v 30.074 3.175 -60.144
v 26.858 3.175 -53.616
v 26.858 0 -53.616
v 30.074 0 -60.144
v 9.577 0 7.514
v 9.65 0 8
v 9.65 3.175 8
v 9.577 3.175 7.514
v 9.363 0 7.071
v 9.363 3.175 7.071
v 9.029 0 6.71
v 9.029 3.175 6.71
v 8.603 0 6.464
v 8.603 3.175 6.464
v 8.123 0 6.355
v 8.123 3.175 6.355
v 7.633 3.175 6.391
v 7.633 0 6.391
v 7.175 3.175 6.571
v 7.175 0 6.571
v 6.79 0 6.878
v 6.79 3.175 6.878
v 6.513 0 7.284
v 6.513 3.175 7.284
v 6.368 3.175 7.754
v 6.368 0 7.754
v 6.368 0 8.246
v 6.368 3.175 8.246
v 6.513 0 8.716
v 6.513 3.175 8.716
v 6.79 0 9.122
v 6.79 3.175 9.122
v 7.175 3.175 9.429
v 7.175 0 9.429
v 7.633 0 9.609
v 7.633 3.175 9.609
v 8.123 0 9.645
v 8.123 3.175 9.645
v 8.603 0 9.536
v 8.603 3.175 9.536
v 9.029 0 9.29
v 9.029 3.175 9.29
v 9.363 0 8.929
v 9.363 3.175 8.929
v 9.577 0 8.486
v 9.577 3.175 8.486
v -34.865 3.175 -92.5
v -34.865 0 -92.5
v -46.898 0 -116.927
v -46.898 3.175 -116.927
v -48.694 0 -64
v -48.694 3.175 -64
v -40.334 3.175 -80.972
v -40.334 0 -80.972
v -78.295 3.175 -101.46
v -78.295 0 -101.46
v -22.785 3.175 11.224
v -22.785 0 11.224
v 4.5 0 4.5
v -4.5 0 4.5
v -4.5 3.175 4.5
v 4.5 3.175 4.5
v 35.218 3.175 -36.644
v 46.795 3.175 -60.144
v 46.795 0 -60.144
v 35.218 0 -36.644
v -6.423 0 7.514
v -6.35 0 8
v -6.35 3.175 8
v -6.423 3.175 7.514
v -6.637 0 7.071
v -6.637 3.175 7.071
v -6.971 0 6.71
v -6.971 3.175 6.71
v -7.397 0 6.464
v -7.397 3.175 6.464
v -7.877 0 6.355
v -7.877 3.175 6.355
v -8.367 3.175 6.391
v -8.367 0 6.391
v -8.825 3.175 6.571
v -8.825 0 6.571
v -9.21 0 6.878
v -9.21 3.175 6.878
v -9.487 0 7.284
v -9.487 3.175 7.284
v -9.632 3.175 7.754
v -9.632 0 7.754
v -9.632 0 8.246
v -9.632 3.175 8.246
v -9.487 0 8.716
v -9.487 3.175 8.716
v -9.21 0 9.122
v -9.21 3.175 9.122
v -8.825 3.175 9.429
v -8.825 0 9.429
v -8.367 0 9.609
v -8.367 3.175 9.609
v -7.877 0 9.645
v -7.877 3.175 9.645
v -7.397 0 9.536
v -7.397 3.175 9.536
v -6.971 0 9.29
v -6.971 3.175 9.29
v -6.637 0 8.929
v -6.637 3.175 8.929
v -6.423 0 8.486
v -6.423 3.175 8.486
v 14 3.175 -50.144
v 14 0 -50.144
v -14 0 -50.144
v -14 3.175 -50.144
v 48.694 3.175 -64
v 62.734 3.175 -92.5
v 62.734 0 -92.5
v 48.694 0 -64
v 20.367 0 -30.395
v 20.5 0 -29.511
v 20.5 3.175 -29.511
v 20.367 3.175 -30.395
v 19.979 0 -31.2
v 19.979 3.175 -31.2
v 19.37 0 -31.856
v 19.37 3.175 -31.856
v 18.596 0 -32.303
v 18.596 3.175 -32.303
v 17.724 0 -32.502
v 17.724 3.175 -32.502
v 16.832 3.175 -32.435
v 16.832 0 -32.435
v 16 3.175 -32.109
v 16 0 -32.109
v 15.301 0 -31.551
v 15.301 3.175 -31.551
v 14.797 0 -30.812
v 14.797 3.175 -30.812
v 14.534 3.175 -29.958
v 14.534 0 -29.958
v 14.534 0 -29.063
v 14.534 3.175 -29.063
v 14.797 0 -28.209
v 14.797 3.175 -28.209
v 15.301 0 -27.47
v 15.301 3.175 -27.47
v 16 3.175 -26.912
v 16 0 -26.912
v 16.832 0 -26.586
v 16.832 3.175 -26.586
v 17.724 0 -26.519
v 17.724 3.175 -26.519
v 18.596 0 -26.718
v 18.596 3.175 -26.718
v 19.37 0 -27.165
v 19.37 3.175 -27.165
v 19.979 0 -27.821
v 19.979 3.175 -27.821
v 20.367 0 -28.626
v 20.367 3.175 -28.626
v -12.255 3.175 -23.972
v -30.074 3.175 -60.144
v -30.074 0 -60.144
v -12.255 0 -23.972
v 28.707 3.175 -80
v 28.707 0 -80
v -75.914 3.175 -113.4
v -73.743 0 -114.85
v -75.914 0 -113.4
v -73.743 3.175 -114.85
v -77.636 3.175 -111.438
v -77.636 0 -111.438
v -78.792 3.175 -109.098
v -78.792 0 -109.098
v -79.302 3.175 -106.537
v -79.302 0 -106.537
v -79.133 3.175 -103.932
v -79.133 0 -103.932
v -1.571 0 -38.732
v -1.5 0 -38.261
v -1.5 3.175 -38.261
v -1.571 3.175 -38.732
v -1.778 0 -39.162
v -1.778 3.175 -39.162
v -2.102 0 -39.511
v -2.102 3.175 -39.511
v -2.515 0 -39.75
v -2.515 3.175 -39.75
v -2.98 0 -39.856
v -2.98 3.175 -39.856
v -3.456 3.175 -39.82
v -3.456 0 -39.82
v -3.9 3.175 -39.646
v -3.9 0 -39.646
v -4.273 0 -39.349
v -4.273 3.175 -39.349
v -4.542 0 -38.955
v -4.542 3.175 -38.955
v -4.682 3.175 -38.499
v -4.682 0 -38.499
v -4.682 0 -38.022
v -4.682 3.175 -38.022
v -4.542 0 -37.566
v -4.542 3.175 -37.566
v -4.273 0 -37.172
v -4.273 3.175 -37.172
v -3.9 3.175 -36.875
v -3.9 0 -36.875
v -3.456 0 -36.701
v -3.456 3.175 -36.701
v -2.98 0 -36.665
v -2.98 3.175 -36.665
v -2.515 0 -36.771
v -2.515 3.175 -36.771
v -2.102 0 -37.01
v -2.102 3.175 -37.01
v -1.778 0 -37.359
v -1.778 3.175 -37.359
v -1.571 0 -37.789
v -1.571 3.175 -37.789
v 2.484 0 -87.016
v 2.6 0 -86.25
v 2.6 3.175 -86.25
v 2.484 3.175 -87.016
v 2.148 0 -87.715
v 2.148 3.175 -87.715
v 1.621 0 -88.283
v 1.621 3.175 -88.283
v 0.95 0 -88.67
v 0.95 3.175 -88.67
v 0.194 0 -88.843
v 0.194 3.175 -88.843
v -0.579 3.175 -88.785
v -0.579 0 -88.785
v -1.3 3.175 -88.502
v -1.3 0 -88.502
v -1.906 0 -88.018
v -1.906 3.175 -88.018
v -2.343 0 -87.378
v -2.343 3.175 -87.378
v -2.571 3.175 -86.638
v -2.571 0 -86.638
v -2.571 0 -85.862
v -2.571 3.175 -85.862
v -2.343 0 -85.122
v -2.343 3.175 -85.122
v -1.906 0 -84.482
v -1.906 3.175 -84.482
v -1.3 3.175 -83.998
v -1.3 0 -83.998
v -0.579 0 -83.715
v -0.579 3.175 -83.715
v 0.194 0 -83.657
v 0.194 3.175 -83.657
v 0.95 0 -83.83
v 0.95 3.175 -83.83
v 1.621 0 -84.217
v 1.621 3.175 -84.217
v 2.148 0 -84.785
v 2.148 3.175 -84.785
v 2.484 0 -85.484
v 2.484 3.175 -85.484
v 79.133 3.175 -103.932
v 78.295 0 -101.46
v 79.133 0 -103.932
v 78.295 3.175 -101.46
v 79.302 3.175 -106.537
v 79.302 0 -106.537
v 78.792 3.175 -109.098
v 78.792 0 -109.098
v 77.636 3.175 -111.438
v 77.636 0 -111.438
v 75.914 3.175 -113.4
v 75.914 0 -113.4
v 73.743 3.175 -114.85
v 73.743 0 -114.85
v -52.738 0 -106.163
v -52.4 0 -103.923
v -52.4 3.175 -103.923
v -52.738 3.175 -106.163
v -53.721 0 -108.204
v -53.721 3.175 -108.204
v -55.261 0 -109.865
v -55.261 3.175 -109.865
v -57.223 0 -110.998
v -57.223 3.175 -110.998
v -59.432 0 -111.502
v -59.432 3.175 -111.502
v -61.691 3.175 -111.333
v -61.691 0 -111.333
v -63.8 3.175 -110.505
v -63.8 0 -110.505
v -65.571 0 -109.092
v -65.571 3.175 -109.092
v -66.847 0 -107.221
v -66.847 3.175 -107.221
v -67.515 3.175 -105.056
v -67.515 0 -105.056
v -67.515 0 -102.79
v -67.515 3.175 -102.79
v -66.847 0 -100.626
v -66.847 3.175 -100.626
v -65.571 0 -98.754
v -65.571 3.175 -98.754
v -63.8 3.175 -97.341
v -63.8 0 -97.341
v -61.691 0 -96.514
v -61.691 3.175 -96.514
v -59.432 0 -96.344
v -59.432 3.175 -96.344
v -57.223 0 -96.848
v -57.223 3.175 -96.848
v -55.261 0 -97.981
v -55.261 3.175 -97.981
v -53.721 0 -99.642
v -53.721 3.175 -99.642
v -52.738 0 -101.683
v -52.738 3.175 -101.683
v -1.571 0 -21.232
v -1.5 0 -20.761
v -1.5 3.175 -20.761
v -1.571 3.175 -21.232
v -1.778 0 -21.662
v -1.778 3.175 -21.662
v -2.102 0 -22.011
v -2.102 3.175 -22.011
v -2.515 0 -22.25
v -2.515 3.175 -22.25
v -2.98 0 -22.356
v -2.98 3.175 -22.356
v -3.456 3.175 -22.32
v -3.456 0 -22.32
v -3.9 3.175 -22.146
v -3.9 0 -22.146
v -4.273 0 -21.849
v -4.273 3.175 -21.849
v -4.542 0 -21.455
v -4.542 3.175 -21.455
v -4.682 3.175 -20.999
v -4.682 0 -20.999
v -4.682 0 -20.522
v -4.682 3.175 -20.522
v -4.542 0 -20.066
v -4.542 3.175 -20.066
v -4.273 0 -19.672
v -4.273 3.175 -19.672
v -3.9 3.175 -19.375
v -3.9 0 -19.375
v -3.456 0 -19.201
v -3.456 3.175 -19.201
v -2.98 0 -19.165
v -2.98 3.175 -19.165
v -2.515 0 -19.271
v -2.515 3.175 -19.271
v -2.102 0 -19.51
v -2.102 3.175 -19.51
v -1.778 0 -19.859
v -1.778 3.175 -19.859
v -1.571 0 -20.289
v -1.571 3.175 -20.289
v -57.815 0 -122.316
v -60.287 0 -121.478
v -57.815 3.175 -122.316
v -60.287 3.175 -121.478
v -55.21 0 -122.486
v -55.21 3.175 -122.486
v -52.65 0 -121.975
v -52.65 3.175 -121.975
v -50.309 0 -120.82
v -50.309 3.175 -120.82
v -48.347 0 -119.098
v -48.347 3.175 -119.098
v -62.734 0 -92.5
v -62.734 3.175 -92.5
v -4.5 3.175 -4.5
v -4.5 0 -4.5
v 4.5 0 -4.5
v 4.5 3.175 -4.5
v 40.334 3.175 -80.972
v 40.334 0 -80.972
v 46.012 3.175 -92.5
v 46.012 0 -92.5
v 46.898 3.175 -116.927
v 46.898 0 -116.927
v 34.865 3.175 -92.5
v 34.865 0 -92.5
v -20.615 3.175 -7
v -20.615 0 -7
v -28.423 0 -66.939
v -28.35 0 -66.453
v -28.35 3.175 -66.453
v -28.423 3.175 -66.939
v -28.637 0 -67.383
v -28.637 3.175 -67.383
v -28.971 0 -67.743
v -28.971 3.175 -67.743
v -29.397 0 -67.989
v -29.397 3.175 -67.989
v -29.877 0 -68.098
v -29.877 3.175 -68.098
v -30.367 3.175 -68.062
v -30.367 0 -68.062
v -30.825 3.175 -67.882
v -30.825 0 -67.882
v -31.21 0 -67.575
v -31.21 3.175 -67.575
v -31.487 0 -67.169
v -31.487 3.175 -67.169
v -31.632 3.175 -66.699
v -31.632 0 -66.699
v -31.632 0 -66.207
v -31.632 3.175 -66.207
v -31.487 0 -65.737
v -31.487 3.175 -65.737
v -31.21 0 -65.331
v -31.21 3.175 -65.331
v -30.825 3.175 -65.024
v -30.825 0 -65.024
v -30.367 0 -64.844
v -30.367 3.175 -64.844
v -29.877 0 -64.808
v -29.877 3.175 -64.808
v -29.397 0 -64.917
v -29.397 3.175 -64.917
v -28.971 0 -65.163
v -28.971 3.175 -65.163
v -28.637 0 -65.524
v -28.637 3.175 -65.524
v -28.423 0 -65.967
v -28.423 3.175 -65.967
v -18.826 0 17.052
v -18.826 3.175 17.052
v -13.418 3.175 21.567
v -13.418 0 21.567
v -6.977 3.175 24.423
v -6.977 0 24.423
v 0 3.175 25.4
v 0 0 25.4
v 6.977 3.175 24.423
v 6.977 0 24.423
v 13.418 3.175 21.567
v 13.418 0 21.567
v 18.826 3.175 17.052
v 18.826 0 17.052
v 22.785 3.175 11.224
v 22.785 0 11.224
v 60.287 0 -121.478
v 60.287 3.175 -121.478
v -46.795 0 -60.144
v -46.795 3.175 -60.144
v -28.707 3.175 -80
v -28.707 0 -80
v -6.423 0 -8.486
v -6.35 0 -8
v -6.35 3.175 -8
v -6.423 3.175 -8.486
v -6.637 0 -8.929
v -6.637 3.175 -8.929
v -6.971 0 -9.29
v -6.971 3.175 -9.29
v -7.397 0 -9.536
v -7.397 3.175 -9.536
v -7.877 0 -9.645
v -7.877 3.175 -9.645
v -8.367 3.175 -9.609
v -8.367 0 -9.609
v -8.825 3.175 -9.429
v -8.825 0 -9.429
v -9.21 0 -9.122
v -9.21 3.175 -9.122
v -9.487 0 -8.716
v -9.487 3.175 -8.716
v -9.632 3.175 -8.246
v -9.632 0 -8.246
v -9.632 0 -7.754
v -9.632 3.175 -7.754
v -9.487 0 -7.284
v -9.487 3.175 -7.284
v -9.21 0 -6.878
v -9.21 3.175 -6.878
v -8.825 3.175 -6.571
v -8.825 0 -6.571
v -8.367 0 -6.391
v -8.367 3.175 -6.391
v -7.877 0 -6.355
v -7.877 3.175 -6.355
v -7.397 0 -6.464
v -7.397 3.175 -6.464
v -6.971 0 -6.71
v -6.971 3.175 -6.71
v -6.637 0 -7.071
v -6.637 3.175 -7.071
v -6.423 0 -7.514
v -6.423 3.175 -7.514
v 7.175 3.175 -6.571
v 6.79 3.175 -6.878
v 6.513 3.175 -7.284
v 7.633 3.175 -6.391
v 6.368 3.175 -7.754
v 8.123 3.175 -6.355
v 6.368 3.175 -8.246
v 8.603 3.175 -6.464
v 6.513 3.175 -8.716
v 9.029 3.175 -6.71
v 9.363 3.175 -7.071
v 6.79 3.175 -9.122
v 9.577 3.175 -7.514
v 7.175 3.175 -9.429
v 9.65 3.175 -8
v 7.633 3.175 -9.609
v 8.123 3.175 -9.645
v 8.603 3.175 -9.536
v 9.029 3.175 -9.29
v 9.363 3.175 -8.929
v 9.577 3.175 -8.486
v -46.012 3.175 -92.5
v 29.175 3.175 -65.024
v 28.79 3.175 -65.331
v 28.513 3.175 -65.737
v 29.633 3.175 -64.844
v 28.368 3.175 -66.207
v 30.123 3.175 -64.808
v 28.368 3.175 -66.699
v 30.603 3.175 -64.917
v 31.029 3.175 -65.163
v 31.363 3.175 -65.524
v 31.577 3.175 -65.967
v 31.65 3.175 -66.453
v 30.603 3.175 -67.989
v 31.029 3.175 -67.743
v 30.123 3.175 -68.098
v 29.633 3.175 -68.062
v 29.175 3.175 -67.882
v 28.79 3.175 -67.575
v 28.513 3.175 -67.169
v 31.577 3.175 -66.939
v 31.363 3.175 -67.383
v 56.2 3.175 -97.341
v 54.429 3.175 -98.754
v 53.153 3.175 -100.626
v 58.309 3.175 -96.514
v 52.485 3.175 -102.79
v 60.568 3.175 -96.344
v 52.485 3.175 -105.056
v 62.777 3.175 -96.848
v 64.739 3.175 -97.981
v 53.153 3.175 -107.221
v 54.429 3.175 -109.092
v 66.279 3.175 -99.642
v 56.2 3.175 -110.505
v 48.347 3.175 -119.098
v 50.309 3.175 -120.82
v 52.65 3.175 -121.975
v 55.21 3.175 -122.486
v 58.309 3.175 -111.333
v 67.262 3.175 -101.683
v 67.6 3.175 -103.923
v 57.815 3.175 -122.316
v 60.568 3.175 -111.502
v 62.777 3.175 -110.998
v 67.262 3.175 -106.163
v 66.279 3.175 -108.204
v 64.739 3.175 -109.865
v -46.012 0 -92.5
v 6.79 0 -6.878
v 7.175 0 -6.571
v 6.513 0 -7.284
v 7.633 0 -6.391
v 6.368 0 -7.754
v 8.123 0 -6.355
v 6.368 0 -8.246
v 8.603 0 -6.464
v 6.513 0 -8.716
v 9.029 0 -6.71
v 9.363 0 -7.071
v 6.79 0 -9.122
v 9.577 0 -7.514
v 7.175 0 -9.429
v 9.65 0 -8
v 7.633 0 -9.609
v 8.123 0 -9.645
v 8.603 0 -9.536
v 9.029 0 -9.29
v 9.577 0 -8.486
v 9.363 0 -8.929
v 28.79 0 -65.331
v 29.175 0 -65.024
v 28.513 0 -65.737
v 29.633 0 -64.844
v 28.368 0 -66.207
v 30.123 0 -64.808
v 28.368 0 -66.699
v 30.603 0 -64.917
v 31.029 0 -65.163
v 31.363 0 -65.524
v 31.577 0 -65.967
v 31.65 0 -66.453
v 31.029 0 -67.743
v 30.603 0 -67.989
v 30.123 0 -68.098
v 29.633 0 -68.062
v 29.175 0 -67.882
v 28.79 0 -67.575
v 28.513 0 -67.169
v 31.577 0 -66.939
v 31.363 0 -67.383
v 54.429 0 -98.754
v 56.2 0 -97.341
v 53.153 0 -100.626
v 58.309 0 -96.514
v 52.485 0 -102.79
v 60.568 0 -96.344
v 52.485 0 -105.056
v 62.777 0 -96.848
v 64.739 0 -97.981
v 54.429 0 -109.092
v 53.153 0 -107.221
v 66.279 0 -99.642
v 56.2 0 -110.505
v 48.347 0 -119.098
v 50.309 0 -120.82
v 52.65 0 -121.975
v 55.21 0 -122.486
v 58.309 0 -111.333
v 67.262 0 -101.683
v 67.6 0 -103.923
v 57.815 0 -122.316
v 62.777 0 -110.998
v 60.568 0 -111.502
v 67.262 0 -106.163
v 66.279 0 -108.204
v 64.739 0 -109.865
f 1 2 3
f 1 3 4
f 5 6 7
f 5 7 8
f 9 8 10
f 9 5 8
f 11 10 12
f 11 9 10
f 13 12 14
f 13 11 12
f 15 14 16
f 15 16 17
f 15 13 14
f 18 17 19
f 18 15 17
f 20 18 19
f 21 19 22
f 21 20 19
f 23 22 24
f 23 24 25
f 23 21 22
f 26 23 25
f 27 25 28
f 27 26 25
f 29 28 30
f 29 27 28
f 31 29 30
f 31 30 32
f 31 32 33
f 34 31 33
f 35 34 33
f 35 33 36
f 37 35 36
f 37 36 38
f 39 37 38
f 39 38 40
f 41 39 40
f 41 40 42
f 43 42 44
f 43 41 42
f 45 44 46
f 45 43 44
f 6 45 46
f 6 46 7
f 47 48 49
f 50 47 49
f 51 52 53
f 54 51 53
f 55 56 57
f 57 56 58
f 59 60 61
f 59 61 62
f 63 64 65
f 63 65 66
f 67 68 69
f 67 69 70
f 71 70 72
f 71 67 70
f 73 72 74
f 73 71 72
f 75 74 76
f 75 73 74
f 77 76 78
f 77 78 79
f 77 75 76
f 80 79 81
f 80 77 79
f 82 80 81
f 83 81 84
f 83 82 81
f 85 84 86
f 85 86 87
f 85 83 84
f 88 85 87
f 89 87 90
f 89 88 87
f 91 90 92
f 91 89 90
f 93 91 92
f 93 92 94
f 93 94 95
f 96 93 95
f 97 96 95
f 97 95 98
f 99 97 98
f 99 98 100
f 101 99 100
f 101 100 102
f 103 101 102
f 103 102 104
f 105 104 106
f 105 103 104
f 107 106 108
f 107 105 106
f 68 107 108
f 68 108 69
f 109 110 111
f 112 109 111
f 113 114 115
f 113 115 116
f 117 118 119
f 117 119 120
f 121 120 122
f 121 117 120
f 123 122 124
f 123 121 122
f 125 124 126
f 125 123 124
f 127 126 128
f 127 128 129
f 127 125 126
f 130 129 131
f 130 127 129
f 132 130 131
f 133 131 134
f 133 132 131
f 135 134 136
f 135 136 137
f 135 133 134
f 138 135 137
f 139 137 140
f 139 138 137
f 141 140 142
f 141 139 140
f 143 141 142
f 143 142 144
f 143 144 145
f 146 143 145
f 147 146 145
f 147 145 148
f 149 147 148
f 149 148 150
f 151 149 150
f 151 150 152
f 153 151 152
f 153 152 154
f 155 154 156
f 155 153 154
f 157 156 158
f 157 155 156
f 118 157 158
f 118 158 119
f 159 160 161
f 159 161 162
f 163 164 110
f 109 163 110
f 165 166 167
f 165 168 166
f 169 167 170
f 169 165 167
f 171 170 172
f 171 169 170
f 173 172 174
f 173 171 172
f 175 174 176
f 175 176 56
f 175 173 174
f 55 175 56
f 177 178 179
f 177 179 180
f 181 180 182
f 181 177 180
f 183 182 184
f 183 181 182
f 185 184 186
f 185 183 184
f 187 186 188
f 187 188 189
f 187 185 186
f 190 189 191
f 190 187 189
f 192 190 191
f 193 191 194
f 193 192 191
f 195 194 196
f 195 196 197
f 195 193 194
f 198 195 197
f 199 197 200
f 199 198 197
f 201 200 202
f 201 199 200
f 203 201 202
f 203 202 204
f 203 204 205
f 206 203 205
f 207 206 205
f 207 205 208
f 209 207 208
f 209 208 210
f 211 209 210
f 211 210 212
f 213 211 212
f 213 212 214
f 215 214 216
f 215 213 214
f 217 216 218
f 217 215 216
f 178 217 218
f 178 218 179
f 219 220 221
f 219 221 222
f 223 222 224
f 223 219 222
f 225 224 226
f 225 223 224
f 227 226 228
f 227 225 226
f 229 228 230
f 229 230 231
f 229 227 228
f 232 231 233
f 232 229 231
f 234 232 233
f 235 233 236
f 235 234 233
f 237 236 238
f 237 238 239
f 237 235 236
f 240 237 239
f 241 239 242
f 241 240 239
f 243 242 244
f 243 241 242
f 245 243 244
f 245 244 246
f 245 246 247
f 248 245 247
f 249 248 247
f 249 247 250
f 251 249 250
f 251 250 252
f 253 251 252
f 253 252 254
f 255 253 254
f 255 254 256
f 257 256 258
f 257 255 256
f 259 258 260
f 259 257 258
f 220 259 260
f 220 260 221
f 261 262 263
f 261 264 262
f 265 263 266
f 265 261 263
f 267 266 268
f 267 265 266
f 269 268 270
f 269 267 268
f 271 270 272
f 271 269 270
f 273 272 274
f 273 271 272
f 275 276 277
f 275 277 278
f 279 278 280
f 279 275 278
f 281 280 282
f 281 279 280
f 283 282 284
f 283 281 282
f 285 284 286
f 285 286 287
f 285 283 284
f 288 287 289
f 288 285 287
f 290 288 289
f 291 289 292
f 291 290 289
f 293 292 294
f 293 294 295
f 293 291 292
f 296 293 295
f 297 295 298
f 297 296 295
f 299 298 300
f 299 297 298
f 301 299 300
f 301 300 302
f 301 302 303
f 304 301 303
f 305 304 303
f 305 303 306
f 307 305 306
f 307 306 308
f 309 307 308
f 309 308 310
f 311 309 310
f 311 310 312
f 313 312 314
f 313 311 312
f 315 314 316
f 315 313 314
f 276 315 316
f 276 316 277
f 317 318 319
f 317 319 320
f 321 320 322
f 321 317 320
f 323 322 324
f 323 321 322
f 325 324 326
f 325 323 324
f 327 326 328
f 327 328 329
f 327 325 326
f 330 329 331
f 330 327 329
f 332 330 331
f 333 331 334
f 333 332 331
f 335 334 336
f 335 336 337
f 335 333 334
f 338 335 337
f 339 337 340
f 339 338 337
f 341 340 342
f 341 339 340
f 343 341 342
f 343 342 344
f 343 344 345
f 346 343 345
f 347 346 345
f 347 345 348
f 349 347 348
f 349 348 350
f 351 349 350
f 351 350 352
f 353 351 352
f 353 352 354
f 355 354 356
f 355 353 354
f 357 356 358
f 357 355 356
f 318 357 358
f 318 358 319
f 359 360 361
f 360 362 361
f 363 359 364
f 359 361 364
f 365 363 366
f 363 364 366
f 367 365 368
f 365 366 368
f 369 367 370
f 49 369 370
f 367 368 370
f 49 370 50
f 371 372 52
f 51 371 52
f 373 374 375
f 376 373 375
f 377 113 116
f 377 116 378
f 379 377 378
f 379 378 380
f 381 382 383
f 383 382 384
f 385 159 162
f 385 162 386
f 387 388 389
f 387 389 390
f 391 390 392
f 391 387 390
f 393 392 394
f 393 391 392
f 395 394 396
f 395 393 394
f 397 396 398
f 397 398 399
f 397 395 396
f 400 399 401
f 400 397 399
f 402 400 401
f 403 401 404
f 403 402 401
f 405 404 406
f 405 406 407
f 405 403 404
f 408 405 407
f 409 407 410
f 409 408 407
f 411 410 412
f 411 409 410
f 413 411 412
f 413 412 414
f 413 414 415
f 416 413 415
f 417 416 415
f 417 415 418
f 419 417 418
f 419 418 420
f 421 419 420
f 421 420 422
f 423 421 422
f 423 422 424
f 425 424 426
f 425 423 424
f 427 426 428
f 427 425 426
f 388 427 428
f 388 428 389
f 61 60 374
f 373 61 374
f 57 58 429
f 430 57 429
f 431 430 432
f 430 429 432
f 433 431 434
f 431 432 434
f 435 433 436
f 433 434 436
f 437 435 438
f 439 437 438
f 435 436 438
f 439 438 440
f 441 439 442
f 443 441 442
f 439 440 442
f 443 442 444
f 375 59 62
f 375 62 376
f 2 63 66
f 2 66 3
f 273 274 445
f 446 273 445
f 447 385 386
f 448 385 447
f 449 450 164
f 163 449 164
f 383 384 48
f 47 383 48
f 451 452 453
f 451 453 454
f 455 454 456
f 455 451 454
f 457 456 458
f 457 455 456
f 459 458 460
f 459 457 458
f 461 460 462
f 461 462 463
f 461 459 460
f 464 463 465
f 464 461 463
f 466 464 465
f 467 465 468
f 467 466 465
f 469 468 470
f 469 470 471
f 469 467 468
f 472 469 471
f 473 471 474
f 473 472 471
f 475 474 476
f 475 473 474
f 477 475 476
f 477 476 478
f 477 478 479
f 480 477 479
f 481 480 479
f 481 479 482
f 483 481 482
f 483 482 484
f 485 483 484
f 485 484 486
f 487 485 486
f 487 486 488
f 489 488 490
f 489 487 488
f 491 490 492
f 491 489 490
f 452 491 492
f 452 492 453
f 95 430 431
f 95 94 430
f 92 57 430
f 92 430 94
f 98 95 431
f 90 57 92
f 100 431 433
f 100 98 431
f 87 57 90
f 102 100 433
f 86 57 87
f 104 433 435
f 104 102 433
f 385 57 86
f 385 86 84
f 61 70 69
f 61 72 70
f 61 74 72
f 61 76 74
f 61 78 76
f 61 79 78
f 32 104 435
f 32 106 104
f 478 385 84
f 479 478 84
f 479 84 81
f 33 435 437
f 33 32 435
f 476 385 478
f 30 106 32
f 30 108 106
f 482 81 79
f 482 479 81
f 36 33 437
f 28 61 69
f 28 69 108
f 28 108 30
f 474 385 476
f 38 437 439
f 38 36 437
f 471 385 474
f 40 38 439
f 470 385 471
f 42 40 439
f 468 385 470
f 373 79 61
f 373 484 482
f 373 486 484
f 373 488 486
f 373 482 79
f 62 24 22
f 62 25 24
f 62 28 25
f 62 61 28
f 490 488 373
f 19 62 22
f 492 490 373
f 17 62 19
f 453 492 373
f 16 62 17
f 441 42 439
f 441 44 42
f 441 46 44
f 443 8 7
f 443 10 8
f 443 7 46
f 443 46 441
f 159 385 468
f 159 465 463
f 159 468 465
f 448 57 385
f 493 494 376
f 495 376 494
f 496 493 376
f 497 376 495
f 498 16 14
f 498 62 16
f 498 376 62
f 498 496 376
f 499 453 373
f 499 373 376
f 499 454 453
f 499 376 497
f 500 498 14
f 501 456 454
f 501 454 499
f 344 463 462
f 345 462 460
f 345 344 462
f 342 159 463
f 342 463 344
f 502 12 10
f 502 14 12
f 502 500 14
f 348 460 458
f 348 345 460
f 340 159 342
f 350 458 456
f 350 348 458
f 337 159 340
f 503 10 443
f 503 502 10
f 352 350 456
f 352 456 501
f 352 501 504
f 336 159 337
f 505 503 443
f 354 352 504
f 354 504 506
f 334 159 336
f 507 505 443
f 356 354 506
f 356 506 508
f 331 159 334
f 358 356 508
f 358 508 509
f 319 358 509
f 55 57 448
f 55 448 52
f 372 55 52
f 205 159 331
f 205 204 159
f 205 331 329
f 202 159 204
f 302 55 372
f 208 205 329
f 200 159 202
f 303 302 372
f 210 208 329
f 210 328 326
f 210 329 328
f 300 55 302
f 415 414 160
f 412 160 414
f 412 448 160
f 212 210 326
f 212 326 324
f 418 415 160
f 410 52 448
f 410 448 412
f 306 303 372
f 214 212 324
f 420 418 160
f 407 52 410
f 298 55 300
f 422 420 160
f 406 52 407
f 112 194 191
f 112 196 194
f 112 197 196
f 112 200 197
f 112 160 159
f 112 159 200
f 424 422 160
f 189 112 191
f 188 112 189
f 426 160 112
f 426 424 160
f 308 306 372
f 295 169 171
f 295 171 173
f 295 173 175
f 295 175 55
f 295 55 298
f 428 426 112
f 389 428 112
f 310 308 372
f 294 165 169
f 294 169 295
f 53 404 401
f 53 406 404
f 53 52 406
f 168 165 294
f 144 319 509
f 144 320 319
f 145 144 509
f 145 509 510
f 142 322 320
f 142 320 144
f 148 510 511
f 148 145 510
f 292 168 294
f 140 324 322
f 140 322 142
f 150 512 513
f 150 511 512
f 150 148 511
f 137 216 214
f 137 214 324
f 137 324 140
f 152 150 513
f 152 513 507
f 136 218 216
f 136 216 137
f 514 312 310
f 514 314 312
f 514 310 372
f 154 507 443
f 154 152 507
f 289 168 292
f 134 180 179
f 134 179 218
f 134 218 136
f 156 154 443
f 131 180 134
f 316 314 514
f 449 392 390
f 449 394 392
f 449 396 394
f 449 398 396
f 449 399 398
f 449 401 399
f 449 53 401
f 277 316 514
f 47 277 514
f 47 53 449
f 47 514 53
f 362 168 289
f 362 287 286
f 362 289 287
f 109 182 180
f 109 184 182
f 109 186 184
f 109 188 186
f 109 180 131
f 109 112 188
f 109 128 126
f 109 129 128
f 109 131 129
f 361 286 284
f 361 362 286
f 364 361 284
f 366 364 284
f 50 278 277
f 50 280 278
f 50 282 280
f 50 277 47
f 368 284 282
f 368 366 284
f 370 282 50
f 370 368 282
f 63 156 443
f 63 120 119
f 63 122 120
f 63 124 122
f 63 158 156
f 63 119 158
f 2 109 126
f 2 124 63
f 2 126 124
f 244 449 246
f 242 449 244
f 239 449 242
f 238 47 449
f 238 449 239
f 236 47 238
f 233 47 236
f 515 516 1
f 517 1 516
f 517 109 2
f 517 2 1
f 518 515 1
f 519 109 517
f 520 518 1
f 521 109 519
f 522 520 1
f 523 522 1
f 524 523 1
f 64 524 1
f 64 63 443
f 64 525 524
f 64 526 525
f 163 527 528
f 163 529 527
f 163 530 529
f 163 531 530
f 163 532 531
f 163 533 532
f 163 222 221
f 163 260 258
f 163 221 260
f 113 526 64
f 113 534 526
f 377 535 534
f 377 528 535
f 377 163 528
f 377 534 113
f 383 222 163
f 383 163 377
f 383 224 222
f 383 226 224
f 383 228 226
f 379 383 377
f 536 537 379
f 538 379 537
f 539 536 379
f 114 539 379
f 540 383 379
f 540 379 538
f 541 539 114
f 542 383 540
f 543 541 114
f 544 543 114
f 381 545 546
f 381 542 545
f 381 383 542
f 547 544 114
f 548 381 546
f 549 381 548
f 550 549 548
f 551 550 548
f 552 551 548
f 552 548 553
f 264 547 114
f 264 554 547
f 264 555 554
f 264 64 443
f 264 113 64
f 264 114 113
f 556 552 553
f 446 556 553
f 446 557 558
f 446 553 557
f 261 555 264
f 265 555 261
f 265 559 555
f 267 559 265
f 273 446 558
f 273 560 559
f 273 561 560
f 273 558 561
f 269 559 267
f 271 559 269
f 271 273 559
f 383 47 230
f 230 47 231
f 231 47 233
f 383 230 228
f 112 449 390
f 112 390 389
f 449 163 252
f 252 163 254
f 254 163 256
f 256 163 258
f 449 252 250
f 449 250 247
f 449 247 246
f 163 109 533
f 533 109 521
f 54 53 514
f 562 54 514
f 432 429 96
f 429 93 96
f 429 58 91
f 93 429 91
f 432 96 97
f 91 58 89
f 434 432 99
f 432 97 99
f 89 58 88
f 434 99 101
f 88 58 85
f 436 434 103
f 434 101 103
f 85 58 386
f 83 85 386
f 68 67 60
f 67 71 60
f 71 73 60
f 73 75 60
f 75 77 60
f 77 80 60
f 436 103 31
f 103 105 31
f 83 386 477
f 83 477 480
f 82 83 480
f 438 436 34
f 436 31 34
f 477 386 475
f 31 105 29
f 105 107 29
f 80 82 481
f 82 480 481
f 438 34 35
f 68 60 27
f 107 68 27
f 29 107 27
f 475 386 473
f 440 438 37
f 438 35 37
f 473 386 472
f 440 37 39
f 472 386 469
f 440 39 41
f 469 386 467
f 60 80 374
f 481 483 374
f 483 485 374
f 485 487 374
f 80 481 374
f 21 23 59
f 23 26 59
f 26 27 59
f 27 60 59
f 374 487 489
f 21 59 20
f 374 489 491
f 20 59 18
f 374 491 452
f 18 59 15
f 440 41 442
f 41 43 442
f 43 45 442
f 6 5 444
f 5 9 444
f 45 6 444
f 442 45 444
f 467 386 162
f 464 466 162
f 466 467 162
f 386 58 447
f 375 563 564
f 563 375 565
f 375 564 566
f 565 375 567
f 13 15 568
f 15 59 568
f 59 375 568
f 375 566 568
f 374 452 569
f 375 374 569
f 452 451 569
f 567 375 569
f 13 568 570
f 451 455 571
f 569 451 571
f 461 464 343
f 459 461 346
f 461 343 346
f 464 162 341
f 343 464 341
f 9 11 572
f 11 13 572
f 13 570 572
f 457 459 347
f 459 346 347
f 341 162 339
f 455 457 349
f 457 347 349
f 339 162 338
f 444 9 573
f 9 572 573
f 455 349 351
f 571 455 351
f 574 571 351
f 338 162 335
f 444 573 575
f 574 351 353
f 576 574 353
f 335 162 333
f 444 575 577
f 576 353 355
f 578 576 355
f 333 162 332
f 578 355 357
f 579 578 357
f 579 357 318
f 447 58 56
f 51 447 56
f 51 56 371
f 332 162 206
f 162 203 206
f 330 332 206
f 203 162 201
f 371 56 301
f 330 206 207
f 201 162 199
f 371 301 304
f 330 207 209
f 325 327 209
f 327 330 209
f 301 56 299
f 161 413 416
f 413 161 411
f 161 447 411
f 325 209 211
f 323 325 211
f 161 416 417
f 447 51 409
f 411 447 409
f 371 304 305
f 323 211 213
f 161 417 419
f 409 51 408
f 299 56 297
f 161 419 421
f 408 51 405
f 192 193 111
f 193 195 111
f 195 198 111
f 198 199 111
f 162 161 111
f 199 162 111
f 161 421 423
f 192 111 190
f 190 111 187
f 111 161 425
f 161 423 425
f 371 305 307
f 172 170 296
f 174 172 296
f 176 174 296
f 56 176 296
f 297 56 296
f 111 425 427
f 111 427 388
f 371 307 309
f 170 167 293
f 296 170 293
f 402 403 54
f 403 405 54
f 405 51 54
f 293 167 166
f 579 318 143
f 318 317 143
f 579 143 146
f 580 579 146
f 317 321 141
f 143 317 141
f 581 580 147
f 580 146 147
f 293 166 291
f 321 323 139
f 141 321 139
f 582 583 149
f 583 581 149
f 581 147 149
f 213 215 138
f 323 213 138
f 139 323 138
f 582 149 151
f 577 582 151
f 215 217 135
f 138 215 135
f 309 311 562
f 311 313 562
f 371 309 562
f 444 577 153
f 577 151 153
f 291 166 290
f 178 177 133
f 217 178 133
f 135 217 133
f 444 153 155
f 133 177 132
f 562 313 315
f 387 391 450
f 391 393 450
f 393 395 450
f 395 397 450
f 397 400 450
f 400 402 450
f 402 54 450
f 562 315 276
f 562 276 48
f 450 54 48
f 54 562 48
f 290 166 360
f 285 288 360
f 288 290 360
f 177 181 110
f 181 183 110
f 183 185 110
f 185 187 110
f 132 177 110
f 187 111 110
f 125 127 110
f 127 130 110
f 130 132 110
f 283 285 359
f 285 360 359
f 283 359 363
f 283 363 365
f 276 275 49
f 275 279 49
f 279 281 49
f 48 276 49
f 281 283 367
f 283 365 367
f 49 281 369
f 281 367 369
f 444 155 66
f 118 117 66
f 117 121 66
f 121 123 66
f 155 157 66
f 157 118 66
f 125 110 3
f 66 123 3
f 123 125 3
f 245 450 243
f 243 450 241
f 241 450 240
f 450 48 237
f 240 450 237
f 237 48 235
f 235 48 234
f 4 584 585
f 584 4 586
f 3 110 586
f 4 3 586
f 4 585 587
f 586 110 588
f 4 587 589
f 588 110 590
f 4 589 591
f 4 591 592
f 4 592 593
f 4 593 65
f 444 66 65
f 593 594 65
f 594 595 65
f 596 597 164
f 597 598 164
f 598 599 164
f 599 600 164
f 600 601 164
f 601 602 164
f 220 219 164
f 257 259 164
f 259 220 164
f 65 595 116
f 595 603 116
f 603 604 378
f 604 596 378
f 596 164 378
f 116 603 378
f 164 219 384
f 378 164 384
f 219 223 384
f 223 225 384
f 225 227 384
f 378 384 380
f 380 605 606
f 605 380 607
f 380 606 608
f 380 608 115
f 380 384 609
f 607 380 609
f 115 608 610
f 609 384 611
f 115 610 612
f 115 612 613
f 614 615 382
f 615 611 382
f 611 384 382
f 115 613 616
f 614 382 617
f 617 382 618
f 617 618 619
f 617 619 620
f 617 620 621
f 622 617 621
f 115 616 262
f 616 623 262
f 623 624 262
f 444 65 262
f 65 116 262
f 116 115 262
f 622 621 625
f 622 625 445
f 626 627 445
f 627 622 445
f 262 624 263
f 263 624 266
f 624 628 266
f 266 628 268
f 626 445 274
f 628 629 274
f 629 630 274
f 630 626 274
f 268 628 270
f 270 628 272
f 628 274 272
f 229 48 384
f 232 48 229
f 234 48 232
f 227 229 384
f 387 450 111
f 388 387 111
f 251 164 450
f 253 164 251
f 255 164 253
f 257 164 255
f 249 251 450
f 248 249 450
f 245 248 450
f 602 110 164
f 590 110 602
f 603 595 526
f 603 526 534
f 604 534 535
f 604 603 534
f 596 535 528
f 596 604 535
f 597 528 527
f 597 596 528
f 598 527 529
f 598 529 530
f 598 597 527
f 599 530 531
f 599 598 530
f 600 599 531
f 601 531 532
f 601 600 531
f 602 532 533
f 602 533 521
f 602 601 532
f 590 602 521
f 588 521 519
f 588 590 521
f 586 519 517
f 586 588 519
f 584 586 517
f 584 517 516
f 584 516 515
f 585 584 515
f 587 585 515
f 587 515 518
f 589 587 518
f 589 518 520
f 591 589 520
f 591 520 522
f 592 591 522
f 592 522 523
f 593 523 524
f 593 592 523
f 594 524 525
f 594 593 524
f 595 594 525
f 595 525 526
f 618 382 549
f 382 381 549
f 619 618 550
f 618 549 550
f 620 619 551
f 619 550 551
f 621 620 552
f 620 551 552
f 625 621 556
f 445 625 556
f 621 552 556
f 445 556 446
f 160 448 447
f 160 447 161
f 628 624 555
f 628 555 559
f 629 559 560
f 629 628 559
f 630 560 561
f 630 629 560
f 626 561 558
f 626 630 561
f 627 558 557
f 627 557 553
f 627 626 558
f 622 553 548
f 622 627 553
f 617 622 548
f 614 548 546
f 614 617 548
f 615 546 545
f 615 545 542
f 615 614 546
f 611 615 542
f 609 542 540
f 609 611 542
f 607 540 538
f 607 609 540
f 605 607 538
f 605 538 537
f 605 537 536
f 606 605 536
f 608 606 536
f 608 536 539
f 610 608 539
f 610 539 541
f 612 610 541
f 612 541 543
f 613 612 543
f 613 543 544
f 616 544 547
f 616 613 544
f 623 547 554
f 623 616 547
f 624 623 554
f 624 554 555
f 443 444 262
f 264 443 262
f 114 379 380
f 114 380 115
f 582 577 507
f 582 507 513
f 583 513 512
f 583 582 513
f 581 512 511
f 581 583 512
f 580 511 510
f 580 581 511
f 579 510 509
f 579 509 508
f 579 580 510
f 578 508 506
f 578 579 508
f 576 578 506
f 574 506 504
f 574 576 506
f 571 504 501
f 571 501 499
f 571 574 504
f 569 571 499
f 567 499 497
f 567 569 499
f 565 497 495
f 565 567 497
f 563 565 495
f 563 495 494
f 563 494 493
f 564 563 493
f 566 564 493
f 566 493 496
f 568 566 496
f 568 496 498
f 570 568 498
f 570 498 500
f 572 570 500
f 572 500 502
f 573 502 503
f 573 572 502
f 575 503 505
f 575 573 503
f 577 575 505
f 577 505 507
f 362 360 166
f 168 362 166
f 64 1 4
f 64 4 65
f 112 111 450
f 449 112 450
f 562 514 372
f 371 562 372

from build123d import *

# Parameters (mm, degrees)
SKETCH1_R               = 1.65
SKETCH1_R_2             = 1.6
SKETCH1_W               = 9
SKETCH1_H               = 9
SKETCH1_R_3             = 3
SKETCH1_R_4             = 7.6
SKETCH1_R_5             = 2.6
BOSS_EXTRUDE1_DEPTH     = 3.175
FILLET1_R               = 10
CUT_EXTRUDE1_DEPTH      = 1
CUT_EXTRUDE1_DEPTH_BACK = 4.175


with BuildPart() as part:
    # Sketch1 → Boss-Extrude1 (new body)
    with BuildSketch(Plane(origin=(0, 0, 0), x_dir=(1, 0, 0), z_dir=(0, 1, 0))):
        with BuildLine():
            Line((-51.31658538, 125.897213638), (-82.713802404, 110.430644428))
            Line((-82.713802404, 110.430644428), (-22.785408926, -11.224310227))
            ThreePointArc((-22.785408926, -11.224310227), (0, -25.4), (22.785408926, -11.224310227))
            Line((22.785408926, -11.224310227), (82.713802404, 110.430644428))
            Line((82.713802404, 110.430644428), (51.31658538, 125.897213638))
            Line((51.31658538, 125.897213638), (34.864798721, 92.5))
            Line((34.864798721, 92.5), (-34.864798721, 92.5))
            Line((-34.864798721, 92.5), (-51.31658538, 125.897213638))
        make_face()
        Polygon((-28.707179242, 80), (28.707179242, 80), (14, 50.144348614), (-14, 50.144348614), align=None, mode=Mode.SUBTRACT)
        with Locations((-8, -8)):
            Circle(SKETCH1_R, mode=Mode.SUBTRACT)
        with Locations((-8, 8)):
            Circle(SKETCH1_R, mode=Mode.SUBTRACT)
        with Locations((-3.1, 20.76053754)):
            Circle(SKETCH1_R_2, mode=Mode.SUBTRACT)
        with Locations((8, -8)):
            Circle(SKETCH1_R, mode=Mode.SUBTRACT)
        Rectangle(SKETCH1_W, SKETCH1_H, mode=Mode.SUBTRACT)
        with Locations((8, 8)):
            Circle(SKETCH1_R, mode=Mode.SUBTRACT)
        with Locations((17.5, 29.51053754)):
            Circle(SKETCH1_R_3, mode=Mode.SUBTRACT)
        with Locations((-30, 66.453060464)):
            Circle(SKETCH1_R, mode=Mode.SUBTRACT)
        with Locations((-60, 103.923048454)):
            Circle(SKETCH1_R_4, mode=Mode.SUBTRACT)
        with Locations((30, 66.453060464)):
            Circle(SKETCH1_R, mode=Mode.SUBTRACT)
        with Locations((60, 103.923048454)):
            Circle(SKETCH1_R_4, mode=Mode.SUBTRACT)
        with Locations((0, 86.25)):
            Circle(SKETCH1_R_5, mode=Mode.SUBTRACT)
        with Locations((-3.1, 38.26053754)):
            Circle(SKETCH1_R_2, mode=Mode.SUBTRACT)
    extrude(amount=BOSS_EXTRUDE1_DEPTH)

    # Fillet1
    fillet1_edges = [part.edges().sort_by_distance(p)[0] for p in [
        (51.31658538, 1.5875, -125.897213638),
        (82.713802404, 1.5875, -110.430644428),
        (-82.713802404, 1.5875, -110.430644428),
        (-51.31658538, 1.5875, -125.897213638),
    ]]
    fillet(fillet1_edges, radius=FILLET1_R)

    # Sketch2 → Cut-Extrude1 (cut, two sides)
    with BuildSketch(Plane(origin=(0, 3.175, 0), x_dir=(1, 0, 0), z_dir=(0, 1, 0))) as cut_extrude1_sk:
        Polygon((-46.79480762, 60.144348614), (-30.073580398, 60.144348614), (-12.254779912, 23.972089701), (-20.615393523, 7), align=None)
        Polygon((-62.733510758, 92.5), (-48.694138346, 64), (-40.333524735, 80.972089701), (-46.012283536, 92.5), align=None)
        Polygon((30.073580398, 60.144348614), (46.79480762, 60.144348614), (35.218483, 36.644348614), (26.857869389, 53.616438315), align=None)
        Polygon((46.012283536, 92.5), (62.733510758, 92.5), (48.694138346, 64), (40.333524735, 80.972089701), align=None)
    extrude(amount=CUT_EXTRUDE1_DEPTH, mode=Mode.SUBTRACT)
    extrude(cut_extrude1_sk.sketch, amount=-CUT_EXTRUDE1_DEPTH_BACK, mode=Mode.SUBTRACT)


solid = part.part
